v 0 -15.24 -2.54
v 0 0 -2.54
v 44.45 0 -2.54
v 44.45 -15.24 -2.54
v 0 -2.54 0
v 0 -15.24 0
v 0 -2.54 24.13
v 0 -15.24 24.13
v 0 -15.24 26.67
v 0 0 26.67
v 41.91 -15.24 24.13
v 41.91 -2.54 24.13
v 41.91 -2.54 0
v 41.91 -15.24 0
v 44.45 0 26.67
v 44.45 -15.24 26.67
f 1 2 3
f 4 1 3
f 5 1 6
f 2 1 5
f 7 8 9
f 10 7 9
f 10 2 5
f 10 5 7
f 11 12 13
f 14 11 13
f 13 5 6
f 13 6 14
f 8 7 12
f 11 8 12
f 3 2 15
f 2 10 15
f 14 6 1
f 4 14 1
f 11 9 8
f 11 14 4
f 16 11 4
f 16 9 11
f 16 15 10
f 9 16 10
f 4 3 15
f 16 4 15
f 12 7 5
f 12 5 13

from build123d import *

# Parameters (mm, degrees)
F0_W     = 41.91
F0_H     = 2.54
F1_DEPTH = 15.24
F0_H_2   = 24.13
F2_DEPTH = 2.54


with BuildPart() as f1:
    # F0 (on Front) → F1 (new body)
    with BuildSketch(Plane.XZ):
        with Locations((20.955, 25.4)):
            Rectangle(F0_W, F0_H)
        Polygon((41.91, 24.13), (41.91, 0), (41.91, -2.54), (44.45, -2.54), (44.45, 26.67), (41.91, 26.67), align=None)
        with Locations((20.955, -1.27)):
            Rectangle(F0_W, F0_H)
    extrude(amount=F1_DEPTH)

    # F0 (on Front) → F2 (join)
    with BuildSketch(Plane.XZ):
        with Locations((20.955, 12.065)):
            Rectangle(F0_W, F0_H_2)
    extrude(amount=F2_DEPTH)


solid = f1.part
